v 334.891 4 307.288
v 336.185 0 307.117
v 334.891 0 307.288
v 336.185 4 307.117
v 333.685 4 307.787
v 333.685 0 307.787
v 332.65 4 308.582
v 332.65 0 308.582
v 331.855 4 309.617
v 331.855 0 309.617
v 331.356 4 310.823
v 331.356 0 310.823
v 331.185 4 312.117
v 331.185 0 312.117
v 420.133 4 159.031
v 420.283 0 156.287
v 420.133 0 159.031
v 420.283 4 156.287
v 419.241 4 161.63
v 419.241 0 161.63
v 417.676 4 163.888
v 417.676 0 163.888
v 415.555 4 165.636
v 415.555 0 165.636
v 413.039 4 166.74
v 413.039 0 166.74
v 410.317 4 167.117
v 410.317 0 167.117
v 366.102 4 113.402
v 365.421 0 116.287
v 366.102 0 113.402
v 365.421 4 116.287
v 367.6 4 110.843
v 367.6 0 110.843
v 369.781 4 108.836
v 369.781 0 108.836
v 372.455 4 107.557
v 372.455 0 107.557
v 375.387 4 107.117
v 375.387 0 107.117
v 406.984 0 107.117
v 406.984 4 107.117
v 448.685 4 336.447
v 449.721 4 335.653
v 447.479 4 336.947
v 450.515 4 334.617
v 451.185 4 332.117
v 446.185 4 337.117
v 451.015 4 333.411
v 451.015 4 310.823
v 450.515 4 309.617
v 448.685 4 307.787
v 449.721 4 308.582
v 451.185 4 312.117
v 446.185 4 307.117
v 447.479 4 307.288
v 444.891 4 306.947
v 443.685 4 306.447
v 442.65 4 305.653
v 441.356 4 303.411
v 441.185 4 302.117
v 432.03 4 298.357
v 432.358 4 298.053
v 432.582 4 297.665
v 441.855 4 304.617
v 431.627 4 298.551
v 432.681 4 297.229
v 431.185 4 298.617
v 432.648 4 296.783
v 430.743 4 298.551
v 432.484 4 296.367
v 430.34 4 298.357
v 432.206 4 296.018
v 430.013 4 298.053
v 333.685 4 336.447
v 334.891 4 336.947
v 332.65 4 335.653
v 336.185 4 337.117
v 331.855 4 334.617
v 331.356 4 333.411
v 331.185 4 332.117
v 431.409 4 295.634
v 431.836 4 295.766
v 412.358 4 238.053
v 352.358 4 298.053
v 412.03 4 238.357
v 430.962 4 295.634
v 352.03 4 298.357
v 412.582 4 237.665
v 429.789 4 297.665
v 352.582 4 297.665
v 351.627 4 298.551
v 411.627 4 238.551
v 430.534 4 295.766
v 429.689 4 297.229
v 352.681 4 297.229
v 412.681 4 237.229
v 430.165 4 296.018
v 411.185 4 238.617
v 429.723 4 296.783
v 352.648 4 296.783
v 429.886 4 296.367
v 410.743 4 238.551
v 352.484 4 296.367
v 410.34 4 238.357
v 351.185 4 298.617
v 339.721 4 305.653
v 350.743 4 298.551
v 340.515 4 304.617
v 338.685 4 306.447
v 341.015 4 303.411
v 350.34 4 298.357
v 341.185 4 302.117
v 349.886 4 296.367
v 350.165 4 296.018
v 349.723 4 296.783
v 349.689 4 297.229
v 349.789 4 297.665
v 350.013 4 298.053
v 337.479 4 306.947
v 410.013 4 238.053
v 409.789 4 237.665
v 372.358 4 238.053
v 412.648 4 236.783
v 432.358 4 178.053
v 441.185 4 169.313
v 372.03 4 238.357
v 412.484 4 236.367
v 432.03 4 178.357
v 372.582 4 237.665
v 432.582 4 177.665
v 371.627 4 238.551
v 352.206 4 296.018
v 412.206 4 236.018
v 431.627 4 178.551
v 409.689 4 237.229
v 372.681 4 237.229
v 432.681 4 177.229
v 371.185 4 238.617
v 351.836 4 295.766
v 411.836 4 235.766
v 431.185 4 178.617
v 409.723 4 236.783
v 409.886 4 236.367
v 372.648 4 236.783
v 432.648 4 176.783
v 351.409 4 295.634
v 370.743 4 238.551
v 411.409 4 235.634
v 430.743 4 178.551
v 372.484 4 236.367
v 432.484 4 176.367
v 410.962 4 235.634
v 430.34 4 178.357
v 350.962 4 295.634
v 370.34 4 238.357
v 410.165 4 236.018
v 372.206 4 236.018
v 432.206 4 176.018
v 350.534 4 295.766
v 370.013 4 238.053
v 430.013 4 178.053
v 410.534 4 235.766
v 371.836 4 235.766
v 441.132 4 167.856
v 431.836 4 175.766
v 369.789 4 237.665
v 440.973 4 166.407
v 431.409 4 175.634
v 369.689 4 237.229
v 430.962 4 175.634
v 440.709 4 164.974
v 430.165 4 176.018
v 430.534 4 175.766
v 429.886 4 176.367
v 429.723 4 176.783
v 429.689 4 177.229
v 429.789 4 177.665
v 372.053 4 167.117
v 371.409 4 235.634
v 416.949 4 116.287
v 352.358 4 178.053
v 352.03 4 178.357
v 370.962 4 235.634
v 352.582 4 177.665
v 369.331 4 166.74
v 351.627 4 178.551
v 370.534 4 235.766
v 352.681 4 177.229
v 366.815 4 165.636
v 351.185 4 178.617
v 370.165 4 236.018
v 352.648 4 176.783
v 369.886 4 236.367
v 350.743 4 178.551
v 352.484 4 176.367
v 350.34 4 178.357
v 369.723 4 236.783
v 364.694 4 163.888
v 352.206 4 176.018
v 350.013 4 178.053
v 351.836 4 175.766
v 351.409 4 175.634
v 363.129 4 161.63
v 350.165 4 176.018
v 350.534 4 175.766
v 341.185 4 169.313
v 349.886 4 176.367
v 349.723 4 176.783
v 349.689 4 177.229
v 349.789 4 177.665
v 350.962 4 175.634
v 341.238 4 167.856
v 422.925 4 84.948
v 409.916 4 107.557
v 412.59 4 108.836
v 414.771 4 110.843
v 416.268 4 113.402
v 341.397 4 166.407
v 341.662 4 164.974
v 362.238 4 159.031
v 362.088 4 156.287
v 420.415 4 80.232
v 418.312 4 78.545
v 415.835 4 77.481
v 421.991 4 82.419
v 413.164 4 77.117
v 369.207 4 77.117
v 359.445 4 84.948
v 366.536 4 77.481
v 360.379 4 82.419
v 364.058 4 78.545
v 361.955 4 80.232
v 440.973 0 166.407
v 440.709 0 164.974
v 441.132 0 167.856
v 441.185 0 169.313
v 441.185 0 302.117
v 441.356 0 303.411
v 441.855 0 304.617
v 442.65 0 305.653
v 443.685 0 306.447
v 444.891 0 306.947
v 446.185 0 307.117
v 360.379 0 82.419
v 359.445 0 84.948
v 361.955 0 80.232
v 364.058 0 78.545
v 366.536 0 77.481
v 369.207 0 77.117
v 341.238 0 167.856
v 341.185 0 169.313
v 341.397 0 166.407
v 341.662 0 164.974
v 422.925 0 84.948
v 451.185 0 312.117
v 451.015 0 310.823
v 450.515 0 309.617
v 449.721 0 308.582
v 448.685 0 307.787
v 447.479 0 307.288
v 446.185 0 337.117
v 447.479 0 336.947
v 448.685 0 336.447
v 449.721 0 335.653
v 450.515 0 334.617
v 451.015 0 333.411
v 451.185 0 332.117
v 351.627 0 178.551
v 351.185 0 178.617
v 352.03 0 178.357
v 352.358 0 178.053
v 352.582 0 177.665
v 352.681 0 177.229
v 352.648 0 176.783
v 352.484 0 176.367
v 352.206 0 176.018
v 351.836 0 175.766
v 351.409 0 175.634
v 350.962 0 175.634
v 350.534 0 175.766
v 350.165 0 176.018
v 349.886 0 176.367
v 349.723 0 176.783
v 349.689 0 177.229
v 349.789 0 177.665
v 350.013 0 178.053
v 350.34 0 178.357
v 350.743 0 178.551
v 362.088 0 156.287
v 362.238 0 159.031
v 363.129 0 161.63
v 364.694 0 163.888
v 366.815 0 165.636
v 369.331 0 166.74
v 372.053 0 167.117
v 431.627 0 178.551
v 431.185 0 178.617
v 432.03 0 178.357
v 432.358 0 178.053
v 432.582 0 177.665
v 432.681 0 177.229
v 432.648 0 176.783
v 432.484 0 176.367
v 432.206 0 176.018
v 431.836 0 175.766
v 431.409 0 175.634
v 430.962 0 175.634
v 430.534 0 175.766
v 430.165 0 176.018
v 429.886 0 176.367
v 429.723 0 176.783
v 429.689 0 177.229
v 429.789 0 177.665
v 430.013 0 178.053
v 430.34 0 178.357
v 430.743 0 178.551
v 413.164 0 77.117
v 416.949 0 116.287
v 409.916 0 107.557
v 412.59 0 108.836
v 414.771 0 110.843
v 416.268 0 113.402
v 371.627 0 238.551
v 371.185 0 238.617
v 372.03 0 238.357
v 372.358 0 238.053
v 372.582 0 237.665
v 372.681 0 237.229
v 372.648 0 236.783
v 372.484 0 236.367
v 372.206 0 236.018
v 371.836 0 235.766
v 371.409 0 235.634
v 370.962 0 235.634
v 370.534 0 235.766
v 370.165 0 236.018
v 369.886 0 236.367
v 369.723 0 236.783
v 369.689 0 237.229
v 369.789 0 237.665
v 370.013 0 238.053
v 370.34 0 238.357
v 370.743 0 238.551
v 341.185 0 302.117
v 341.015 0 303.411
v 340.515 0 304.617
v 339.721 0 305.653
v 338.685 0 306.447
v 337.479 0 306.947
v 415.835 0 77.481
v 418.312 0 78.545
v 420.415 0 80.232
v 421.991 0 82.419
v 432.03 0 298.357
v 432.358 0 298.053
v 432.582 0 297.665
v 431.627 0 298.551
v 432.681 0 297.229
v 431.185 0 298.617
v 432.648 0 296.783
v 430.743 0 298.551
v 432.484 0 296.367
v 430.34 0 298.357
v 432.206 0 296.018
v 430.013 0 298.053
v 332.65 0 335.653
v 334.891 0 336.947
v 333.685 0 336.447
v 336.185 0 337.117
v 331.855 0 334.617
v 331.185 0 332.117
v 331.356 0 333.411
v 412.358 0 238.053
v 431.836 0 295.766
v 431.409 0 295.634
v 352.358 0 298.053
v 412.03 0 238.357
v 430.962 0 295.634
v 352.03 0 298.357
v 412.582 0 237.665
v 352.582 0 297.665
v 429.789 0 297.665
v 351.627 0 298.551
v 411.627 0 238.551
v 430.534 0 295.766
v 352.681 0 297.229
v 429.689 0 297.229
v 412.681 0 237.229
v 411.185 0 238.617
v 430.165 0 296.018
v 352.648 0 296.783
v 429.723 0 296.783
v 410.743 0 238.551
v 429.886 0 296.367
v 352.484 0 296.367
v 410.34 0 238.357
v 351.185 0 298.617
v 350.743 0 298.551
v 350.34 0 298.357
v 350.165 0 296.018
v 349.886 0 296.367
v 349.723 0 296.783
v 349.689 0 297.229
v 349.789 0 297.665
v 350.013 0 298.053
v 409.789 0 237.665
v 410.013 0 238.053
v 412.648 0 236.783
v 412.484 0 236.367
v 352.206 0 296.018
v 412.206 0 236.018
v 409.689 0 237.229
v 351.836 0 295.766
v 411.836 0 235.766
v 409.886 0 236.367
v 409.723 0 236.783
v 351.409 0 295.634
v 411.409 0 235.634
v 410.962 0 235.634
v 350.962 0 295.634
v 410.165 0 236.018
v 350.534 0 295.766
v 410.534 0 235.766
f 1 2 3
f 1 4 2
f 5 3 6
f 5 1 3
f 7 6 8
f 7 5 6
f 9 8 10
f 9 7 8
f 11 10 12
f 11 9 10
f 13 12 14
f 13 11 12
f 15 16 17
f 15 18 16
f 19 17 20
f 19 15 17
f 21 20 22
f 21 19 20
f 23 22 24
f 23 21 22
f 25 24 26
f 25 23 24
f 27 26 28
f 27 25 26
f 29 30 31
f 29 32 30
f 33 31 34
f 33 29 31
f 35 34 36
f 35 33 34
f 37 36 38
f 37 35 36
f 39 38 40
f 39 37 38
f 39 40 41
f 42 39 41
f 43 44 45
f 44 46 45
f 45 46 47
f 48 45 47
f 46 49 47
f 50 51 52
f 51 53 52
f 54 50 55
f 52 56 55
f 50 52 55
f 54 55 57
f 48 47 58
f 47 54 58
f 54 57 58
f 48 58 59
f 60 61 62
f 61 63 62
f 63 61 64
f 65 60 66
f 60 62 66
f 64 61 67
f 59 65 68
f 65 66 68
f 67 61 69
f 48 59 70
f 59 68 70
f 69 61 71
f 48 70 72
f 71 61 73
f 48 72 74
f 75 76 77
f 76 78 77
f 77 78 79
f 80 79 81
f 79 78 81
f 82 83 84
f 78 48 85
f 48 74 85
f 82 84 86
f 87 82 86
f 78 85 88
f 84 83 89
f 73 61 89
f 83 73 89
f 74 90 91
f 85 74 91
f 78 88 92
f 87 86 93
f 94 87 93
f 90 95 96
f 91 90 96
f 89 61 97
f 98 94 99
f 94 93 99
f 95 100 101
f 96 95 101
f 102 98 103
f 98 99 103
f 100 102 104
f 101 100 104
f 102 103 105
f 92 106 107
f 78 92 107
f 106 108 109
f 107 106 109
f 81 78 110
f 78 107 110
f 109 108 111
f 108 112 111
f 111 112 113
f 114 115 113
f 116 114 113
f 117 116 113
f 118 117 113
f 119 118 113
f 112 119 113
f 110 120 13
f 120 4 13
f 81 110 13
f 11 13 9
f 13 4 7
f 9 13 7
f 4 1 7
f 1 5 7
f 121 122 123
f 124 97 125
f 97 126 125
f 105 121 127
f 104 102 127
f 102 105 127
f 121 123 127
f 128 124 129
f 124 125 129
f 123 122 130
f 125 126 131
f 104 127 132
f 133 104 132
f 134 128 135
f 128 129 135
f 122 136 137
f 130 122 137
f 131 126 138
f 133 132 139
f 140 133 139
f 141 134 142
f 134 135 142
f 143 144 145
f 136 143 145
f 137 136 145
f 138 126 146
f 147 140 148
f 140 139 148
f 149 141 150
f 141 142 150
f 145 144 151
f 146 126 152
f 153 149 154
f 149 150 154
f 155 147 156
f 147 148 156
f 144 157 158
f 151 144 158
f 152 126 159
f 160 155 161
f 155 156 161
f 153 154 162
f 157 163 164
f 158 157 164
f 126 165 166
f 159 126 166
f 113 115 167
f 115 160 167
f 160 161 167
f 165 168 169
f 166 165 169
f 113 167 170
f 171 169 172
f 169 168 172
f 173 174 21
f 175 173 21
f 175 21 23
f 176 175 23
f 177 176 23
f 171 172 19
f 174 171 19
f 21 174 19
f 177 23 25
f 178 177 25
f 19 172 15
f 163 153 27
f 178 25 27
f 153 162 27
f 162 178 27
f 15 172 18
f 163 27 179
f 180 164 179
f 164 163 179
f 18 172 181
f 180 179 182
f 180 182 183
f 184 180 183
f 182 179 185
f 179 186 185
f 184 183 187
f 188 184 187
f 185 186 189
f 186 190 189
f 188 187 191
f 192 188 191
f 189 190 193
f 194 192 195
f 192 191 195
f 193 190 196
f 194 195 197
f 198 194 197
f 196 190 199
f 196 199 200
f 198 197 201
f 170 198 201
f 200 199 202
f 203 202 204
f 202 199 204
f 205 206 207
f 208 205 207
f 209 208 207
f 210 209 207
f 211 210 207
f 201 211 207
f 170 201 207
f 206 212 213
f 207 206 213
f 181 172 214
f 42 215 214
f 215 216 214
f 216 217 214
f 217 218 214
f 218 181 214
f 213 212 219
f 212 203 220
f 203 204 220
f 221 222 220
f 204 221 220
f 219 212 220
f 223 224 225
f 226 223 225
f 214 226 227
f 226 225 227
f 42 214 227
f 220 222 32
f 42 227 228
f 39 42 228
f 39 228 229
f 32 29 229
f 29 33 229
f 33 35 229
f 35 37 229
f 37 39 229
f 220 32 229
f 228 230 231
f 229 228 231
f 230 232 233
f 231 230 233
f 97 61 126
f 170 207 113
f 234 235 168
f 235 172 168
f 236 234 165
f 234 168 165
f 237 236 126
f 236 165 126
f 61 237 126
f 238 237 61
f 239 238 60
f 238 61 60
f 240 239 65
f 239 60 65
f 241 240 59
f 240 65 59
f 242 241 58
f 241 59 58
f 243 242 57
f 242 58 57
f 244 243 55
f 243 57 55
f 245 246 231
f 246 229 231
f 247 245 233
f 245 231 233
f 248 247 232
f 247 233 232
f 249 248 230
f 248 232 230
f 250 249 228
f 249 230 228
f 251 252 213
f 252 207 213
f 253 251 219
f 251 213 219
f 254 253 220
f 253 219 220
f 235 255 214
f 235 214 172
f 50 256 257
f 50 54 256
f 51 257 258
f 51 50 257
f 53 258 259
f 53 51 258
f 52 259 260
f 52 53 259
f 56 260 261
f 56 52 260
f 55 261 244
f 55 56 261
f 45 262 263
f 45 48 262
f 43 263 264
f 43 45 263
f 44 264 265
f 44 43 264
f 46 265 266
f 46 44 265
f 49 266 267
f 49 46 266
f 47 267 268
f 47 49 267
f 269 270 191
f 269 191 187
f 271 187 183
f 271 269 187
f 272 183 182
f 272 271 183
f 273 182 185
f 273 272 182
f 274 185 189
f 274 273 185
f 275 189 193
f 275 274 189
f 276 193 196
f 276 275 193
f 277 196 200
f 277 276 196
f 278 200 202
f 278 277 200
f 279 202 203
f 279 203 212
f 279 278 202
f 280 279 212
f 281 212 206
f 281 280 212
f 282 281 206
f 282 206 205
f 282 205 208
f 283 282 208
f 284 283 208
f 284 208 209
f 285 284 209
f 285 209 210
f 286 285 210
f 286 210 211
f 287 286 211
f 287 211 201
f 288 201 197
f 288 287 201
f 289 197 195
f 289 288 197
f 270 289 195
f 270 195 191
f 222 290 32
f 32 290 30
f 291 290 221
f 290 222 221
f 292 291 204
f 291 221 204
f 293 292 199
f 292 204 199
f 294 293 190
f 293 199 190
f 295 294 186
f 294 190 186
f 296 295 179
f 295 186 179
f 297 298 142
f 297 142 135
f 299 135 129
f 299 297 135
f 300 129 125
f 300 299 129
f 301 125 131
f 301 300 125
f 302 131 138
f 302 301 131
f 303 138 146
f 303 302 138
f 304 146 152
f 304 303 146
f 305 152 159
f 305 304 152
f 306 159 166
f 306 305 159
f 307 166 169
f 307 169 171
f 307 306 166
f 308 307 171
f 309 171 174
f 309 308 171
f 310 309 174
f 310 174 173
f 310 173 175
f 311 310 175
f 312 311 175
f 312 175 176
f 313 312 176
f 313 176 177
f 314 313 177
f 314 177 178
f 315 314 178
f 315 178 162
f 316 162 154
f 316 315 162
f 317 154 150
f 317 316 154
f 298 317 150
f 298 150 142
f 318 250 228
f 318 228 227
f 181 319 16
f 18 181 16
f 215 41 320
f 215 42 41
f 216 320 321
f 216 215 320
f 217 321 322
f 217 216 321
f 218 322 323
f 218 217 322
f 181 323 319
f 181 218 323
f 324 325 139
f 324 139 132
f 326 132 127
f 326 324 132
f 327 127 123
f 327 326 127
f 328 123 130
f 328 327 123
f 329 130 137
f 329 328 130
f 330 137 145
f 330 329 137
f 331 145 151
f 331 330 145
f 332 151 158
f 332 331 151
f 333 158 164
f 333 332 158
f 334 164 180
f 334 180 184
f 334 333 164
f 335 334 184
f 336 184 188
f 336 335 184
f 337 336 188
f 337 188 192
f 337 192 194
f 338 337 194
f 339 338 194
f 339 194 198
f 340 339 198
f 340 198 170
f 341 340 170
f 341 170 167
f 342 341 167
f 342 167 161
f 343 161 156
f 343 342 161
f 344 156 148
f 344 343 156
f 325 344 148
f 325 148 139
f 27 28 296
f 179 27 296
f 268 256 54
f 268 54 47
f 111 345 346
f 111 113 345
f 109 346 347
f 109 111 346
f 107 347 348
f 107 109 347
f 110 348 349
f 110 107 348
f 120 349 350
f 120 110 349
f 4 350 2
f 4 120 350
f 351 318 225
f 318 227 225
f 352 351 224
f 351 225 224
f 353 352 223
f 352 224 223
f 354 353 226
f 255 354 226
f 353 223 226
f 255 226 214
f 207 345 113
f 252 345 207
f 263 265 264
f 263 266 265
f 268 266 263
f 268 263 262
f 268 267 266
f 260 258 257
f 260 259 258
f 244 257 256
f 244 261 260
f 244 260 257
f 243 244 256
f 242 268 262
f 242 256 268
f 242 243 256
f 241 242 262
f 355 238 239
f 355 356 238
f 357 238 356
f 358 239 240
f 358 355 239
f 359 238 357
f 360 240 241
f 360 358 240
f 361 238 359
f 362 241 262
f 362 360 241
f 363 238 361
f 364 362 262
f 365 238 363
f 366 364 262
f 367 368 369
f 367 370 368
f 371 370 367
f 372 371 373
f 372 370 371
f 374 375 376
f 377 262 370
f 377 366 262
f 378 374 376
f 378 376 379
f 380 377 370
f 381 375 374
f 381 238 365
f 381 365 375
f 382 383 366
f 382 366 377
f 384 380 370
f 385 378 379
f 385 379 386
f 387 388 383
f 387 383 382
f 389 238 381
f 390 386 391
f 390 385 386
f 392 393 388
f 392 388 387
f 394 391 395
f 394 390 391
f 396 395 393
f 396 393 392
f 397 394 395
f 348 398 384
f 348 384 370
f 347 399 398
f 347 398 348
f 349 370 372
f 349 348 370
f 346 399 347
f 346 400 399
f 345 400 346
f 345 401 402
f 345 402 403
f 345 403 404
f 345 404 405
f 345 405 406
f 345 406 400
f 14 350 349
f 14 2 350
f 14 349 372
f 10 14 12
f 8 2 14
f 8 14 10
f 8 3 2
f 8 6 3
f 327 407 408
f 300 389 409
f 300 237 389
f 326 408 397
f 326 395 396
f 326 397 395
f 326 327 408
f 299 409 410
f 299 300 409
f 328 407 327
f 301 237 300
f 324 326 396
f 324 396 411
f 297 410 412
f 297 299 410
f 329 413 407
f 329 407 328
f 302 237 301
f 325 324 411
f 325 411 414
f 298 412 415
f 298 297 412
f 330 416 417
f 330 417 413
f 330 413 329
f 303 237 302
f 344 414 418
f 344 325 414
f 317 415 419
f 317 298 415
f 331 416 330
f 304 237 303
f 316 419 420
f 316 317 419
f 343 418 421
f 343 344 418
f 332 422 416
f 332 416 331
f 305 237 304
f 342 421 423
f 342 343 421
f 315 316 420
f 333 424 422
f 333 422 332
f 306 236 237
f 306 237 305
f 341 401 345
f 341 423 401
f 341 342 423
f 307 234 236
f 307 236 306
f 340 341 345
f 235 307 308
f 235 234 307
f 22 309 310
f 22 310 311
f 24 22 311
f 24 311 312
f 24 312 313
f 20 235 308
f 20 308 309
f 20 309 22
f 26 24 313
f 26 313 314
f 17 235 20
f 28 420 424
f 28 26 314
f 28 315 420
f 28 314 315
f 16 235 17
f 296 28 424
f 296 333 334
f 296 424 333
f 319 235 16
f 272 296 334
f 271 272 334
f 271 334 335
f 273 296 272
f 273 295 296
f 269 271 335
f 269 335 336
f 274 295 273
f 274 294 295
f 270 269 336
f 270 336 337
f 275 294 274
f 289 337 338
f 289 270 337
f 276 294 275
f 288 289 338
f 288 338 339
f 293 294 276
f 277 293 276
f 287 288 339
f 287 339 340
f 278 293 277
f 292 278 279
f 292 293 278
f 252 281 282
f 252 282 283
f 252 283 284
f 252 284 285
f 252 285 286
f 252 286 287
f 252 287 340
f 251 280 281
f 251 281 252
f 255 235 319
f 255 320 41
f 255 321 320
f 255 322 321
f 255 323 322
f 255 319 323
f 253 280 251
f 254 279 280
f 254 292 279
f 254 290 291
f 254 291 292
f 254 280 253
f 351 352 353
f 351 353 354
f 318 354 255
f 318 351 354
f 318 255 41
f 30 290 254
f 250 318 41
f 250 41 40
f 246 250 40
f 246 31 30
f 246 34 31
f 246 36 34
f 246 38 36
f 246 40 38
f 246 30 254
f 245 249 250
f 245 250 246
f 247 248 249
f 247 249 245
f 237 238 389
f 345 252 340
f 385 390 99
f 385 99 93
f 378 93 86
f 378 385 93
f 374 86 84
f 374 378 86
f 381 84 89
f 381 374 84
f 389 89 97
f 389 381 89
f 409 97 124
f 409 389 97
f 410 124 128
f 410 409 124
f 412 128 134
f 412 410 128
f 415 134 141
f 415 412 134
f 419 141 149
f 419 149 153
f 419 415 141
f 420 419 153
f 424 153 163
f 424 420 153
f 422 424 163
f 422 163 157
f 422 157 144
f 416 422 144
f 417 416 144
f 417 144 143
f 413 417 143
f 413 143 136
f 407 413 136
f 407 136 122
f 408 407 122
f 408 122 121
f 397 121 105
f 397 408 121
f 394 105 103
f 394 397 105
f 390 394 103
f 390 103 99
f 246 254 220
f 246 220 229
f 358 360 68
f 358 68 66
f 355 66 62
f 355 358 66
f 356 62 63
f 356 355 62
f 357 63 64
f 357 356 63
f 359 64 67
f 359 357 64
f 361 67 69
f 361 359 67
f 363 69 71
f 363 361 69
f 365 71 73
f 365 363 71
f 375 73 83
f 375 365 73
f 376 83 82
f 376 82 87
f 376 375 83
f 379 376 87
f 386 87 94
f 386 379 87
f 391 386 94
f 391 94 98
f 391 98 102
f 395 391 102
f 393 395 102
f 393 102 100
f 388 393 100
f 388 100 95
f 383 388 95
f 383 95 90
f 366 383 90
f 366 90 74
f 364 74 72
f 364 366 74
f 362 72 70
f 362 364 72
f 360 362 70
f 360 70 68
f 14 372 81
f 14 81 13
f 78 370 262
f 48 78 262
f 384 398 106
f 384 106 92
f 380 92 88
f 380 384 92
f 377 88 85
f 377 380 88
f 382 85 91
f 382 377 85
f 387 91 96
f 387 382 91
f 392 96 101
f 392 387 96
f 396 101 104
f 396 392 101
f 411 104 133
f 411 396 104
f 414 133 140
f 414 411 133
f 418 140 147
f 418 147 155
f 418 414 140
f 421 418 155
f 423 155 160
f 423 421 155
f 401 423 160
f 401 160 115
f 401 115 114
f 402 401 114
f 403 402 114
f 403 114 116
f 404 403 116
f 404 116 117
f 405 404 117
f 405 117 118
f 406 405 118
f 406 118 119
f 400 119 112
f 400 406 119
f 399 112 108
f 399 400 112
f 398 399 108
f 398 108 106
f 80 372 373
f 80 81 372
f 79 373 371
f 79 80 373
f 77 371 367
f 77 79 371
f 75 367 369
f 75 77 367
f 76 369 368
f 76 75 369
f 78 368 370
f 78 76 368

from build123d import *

# Parameters (mm, degrees)
SKETCH_1_R      = 1.5
EXTRUDE_1_DEPTH = 4
FILLET_1_R      = 5
FILLET_2_R      = 20
FILLET_3_R      = 10
FILLET_4_R      = 10


with BuildPart() as part:
    # Эскиз1 → Бобышка-Вытянуть1 (new body)
    with BuildSketch(Plane(origin=(0, 0, 0), x_dir=(1, 0, 0), z_dir=(0, 1, 0))):
        Polygon((341.185276631, -307.117267335), (341.185276631, -167.117267335), (361.185276631, -77.117267335), (421.185276631, -77.117267335), (441.185276631, -167.117267335), (441.185276631, -307.117267335), (451.185276631, -307.117267335), (451.185276631, -337.117267335), (391.185276631, -337.117267335), (331.185276631, -337.117267335), (331.185276631, -307.117267335), align=None)
        with Locations(Location((351.185276631, -177.117267335, 0), (0, 0, 270))):
            Circle(SKETCH_1_R, mode=Mode.SUBTRACT)
        with Locations(Location((431.185276631, -177.117267335, 0), (0, 0, 270))):
            Circle(SKETCH_1_R, mode=Mode.SUBTRACT)
        with Locations(Location((431.185276631, -297.117267335, 0), (0, 0, 270))):
            Circle(SKETCH_1_R, mode=Mode.SUBTRACT)
        with Locations(Location((351.185276631, -297.117267335, 0), (0, 0, 270))):
            Circle(SKETCH_1_R, mode=Mode.SUBTRACT)
        with Locations(Location((371.185276631, -237.117267335, 0), (0, 0, 270))):
            Circle(SKETCH_1_R, mode=Mode.SUBTRACT)
        with Locations(Location((411.185276631, -237.117267335, 0), (0, 0, 270))):
            Circle(SKETCH_1_R, mode=Mode.SUBTRACT)
        Polygon((361.185276631, -167.117267335), (366.185276631, -107.117267335), (416.185276631, -107.117267335), (421.185276631, -167.117267335), align=None, mode=Mode.SUBTRACT)
    extrude(amount=EXTRUDE_1_DEPTH)

    # Скругление1
    fillet_1_edges = [part.edges().sort_by_distance(p)[0] for p in [
        (441.185276631, 2, 307.117267335),
        (341.185276631, 2, 307.117267335),
        (331.185276631, 2, 307.117267335),
        (331.185276631, 2, 337.117267335),
        (451.185276631, 2, 337.117267335),
        (451.185276631, 2, 307.117267335),
    ]]
    fillet(fillet_1_edges, radius=FILLET_1_R - 0.0001)  # a hair under: the kernel refuses the full size

    # Скругление2
    fillet_2_edges = [part.edges().sort_by_distance(p)[0] for p in [
        (441.185276631, 2, 167.117267335),
        (341.185276631, 2, 167.117267335),
    ]]
    fillet(fillet_2_edges, radius=FILLET_2_R)

    # Скругление3
    fillet_3_edges = [part.edges().sort_by_distance(p)[0] for p in [
        (416.185276631, 2, 107.117267335),
        (366.185276631, 2, 107.117267335),
        (361.185276631, 2, 167.117267335),
        (421.185276631, 2, 167.117267335),
    ]]
    fillet(fillet_3_edges, radius=FILLET_3_R)

    # Скругление4
    fillet_4_edges = [part.edges().sort_by_distance(p)[0] for p in [
        (361.185276631, 2, 77.117267335),
        (421.185276631, 2, 77.117267335),
    ]]
    fillet(fillet_4_edges, radius=FILLET_4_R)


solid = part.part
